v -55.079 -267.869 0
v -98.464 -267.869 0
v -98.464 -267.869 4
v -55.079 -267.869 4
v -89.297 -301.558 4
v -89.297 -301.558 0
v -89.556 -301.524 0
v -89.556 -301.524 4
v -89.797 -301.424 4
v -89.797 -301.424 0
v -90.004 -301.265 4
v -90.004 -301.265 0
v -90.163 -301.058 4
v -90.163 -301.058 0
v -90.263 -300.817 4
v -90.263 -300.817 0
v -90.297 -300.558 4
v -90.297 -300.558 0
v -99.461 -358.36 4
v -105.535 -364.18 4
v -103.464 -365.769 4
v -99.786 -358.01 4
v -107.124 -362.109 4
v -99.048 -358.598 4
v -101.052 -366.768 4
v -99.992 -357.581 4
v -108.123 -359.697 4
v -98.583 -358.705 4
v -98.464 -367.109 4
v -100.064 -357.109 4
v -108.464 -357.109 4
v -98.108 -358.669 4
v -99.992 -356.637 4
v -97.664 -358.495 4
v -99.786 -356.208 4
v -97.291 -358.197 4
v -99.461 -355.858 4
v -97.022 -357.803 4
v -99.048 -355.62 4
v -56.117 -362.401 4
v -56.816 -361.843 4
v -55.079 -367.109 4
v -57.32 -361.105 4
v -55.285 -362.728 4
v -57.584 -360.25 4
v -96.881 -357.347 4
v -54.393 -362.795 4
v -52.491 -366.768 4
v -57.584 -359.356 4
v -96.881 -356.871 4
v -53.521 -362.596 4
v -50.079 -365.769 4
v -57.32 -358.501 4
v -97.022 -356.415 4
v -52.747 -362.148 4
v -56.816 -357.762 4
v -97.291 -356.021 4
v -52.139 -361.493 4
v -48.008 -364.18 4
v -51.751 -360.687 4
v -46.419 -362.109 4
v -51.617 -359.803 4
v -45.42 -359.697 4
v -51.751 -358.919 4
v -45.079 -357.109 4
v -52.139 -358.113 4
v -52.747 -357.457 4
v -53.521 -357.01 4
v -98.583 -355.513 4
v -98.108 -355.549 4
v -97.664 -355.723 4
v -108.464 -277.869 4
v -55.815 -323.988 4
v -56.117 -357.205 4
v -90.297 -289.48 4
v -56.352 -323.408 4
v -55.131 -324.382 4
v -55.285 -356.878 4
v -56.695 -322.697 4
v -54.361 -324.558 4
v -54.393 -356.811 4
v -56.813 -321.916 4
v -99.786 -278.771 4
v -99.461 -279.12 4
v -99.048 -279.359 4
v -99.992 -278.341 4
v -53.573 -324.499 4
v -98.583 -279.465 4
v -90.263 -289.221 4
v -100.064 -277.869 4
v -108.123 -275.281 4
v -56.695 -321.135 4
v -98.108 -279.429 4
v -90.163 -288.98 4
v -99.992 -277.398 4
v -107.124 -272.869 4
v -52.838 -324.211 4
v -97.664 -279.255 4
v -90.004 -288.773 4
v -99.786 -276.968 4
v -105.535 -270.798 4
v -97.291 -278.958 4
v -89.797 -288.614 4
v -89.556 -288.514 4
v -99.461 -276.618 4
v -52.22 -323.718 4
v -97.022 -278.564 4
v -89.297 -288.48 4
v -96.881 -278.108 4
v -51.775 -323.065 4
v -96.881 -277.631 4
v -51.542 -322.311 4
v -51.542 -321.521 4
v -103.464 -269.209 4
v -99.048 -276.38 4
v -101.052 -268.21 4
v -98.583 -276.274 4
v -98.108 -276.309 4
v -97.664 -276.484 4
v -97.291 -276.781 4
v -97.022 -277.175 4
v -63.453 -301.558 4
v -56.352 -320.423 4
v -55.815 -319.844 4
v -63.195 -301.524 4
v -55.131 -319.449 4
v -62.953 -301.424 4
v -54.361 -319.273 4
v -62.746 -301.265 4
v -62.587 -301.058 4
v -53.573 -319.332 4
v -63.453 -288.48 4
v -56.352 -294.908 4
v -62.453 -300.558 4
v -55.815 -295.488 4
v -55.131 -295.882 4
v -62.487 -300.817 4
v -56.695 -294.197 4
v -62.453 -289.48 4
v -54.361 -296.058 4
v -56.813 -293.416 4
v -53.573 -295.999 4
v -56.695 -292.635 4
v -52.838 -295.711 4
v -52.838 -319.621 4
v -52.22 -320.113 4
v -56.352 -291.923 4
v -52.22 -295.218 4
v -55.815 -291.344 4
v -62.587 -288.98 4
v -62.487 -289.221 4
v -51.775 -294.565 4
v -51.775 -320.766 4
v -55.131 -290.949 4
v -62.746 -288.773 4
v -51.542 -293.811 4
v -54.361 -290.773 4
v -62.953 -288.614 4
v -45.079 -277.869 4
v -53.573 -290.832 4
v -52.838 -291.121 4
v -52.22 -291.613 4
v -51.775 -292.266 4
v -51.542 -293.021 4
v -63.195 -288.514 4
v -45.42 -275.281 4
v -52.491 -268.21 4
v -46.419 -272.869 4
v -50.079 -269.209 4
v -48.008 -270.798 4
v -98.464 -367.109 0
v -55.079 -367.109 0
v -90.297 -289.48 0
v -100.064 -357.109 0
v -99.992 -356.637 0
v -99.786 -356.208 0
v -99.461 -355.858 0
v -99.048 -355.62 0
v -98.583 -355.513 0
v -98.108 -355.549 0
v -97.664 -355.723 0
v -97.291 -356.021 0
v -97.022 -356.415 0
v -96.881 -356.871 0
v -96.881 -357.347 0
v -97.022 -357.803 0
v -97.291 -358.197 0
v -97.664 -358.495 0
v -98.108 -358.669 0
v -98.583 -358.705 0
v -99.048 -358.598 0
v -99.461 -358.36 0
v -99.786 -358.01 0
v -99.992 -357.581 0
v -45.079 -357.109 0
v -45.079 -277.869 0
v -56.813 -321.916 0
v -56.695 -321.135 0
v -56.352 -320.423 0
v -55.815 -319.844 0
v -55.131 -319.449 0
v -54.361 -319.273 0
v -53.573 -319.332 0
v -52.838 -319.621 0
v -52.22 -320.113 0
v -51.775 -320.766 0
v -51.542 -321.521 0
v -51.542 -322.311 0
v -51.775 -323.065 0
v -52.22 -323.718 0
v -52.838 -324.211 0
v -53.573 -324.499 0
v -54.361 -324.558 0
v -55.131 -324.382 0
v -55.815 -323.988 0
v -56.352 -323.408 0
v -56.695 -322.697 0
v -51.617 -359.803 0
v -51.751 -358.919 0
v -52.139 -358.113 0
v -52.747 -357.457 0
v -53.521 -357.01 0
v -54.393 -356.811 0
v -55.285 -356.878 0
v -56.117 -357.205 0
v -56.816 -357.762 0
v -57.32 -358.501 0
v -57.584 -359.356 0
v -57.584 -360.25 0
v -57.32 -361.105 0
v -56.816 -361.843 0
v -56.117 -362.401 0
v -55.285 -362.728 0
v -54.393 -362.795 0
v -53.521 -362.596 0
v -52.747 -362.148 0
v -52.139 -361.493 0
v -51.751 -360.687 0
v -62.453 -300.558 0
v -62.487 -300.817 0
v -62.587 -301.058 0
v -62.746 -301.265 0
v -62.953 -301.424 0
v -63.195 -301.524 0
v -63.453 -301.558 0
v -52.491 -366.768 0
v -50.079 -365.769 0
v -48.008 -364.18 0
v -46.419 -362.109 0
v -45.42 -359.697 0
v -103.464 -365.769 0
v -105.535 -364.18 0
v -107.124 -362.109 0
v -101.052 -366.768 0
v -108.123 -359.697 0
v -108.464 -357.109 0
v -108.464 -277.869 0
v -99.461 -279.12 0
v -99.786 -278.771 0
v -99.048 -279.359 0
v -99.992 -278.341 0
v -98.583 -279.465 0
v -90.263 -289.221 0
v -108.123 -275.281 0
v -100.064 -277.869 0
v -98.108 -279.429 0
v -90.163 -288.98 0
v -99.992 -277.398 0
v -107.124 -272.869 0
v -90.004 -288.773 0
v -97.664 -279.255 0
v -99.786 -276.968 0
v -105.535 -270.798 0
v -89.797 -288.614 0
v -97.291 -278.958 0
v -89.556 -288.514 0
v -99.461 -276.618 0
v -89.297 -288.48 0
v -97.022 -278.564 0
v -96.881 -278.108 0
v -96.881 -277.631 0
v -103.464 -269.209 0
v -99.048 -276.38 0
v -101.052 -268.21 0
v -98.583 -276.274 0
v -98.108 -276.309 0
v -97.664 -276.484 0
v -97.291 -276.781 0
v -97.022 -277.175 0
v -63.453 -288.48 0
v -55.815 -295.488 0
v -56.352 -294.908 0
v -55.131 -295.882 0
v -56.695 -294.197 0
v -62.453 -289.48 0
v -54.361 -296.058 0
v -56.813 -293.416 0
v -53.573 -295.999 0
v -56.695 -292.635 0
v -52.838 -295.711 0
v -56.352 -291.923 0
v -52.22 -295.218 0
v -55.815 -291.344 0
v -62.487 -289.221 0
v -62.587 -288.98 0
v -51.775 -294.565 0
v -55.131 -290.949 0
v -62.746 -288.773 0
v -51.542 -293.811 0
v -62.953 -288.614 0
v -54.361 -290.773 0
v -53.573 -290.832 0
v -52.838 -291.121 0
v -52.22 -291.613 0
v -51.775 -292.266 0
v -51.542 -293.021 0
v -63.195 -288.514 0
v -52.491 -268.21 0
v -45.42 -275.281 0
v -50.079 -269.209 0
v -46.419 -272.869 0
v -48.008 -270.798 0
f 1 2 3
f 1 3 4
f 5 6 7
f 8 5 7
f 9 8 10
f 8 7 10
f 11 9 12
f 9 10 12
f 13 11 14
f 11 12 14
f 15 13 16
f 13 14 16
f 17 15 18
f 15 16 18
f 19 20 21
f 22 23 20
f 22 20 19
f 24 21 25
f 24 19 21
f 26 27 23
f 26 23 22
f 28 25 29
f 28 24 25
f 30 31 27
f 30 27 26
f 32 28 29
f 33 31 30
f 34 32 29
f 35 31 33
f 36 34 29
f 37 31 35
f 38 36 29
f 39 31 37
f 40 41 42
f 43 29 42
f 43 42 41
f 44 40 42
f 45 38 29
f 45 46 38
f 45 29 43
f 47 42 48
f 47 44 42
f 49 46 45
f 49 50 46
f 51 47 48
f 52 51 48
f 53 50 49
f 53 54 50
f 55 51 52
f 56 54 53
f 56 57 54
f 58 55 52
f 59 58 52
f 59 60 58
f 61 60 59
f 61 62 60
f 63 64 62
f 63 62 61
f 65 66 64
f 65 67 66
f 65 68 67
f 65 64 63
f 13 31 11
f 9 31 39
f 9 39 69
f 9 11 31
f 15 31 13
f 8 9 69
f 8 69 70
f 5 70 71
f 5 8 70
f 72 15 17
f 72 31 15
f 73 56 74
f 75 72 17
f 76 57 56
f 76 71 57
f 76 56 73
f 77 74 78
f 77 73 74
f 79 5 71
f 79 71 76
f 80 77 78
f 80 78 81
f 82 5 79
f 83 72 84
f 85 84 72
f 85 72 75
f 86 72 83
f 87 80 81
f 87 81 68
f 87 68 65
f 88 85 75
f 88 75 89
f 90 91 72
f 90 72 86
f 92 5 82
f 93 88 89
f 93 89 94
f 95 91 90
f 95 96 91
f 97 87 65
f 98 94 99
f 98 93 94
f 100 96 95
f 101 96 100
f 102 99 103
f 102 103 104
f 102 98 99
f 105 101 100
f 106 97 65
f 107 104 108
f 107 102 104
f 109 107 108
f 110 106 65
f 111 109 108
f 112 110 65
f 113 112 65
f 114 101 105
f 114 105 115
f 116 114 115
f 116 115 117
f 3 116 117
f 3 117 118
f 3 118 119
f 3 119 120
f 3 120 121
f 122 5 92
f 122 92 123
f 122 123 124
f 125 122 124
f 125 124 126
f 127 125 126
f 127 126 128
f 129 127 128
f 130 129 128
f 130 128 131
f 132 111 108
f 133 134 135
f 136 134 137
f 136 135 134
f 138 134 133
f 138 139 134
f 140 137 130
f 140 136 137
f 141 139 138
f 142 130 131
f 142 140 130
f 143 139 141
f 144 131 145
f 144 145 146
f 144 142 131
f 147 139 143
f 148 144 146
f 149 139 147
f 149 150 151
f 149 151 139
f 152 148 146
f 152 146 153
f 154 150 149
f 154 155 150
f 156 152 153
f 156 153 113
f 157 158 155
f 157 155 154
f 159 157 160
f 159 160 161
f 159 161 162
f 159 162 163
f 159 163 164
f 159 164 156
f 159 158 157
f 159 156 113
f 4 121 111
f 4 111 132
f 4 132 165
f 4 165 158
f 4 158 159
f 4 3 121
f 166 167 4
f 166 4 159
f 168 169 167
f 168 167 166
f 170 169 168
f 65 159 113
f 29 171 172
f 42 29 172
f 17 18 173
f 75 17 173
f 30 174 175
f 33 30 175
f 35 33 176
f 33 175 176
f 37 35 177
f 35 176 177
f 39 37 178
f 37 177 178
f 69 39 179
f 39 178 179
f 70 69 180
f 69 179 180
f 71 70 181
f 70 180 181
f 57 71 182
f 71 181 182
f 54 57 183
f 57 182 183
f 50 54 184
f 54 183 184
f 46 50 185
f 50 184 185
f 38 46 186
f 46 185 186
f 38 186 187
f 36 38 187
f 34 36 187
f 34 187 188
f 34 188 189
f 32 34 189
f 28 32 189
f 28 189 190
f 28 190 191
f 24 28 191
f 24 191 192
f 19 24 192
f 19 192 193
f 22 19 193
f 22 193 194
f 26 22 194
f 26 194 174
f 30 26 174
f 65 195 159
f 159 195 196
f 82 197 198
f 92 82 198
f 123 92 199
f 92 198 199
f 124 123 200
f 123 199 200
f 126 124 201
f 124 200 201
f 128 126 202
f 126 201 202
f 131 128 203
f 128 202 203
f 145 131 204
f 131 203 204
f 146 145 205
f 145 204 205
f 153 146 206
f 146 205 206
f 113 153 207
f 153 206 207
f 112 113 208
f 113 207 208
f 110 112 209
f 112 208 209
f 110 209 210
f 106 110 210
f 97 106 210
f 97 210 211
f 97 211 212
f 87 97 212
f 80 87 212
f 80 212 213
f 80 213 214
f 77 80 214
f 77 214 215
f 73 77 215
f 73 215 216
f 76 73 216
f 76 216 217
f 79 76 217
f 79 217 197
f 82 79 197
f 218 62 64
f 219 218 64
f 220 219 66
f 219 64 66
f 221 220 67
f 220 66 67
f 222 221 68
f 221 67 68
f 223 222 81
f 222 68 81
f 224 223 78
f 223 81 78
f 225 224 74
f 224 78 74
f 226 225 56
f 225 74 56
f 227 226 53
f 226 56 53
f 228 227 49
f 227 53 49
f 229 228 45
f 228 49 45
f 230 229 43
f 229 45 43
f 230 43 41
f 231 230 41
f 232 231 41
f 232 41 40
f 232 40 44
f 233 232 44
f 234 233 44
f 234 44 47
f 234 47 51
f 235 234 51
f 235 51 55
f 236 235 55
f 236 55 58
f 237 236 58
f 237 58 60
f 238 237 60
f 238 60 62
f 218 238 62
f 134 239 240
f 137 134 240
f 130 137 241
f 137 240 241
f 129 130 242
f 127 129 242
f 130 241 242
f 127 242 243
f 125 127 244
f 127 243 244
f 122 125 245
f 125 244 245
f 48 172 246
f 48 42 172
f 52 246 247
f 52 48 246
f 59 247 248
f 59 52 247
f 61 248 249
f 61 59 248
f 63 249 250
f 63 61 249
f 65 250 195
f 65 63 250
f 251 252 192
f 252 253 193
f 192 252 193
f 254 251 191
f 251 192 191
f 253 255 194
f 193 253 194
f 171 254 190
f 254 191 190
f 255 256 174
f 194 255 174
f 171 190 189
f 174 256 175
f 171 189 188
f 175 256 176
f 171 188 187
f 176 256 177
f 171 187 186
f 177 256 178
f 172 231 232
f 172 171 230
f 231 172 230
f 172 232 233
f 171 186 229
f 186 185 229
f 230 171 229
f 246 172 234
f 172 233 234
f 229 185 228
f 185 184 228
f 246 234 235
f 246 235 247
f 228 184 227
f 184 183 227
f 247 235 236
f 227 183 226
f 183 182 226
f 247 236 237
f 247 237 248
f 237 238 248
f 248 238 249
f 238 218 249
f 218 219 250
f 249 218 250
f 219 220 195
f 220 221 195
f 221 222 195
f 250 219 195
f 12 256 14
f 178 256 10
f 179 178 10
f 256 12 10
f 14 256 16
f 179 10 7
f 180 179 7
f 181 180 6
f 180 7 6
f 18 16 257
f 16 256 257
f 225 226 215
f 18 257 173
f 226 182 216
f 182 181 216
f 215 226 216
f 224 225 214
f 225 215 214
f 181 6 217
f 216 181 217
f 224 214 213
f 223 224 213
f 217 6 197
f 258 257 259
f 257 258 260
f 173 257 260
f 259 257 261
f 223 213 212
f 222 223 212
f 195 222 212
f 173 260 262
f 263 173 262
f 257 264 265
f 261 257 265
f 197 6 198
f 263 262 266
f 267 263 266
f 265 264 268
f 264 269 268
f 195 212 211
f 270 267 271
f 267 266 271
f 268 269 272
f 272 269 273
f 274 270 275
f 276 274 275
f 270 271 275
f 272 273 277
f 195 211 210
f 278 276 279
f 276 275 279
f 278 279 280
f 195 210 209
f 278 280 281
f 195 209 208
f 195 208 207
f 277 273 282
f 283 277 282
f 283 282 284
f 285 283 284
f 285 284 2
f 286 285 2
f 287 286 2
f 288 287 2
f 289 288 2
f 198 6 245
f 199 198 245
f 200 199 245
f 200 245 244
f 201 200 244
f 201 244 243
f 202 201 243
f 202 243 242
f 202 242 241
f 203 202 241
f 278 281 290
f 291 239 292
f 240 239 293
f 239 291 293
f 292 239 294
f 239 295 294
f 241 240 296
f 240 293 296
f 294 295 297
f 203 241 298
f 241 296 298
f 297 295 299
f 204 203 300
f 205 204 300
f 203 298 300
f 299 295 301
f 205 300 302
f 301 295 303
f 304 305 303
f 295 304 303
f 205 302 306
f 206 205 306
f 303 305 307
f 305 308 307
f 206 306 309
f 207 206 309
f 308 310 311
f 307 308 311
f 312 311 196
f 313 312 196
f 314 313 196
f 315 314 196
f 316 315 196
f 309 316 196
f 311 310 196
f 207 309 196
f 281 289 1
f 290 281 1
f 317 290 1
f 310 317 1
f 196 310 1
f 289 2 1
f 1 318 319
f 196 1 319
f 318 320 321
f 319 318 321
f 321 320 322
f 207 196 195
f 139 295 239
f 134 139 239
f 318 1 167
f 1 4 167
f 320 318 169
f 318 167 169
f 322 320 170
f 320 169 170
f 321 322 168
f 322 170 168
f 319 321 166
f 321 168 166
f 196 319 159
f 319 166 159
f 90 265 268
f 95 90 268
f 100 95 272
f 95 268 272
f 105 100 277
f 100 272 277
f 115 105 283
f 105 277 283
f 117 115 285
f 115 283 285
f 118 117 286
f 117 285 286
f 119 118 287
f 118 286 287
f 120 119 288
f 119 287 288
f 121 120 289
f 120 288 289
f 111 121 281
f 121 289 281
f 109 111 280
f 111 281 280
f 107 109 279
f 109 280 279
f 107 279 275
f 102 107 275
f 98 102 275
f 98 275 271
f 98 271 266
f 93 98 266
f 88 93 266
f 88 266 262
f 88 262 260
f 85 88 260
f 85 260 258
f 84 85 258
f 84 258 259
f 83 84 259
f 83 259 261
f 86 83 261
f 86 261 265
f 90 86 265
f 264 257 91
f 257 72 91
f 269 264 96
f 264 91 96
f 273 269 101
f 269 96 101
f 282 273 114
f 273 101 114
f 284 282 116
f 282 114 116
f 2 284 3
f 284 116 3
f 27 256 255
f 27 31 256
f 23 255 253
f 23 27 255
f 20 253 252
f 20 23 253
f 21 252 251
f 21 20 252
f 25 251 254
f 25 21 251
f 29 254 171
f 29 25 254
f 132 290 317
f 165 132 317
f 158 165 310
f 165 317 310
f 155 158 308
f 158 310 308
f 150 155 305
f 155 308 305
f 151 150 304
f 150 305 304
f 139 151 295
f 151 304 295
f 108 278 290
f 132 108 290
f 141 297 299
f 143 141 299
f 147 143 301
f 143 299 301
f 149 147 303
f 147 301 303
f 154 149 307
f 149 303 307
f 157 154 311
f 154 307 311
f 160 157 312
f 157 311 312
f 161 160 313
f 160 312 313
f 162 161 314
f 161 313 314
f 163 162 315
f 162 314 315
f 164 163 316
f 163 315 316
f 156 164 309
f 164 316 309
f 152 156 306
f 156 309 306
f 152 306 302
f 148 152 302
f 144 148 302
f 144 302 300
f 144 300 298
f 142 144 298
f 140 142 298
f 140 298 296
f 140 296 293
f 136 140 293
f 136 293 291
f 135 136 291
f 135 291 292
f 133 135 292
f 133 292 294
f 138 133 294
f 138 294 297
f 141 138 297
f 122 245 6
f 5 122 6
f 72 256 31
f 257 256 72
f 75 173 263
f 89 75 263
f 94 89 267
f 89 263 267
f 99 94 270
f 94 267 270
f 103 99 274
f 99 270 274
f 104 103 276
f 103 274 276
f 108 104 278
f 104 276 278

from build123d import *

# Parameters (mm, degrees)
SKETCH1_W            = 63.384201813
SKETCH1_H            = 99.23964582
BOSS_EXTRUDE1_DEPTH  = 4
M5_CLEARANCE_HOLE1_D = 5.3
FILLET1_R            = 10
M5_CLEARANCE_HOLE2_D = 6
M3_CLEARANCE_HOLE1_D = 3.2


with BuildPart() as part:
    # Sketch1 → Boss-Extrude1 (new body)
    with BuildSketch(Plane.XY):
        with Locations((-76.771477461, -317.489186132)):
            Rectangle(SKETCH1_W, SKETCH1_H)
        with BuildLine():
            Line((-63.453357461, -301.557900971), (-89.297127128, -301.557900971))
            ThreePointArc((-89.297127128, -301.557900971), (-90.004233909, -301.265007752), (-90.297127128, -300.557900971))
            Line((-90.297127128, -300.557900971), (-90.297127128, -289.479666407))
            ThreePointArc((-90.297127128, -289.479666407), (-90.004233909, -288.772559625), (-89.297127128, -288.479666407))
            Line((-89.297127128, -288.479666407), (-63.453357461, -288.479666407))
            ThreePointArc((-63.453357461, -288.479666407), (-62.74625068, -288.772559625), (-62.453357461, -289.479666407))
            Line((-62.453357461, -289.479666407), (-62.453357461, -300.557900971))
            ThreePointArc((-62.453357461, -300.557900971), (-62.74625068, -301.265007752), (-63.453357461, -301.557900971))
        make_face(mode=Mode.SUBTRACT)
    extrude(amount=BOSS_EXTRUDE1_DEPTH)

    # M5 Clearance Hole1 (through all)
    with Locations(Plane.XY.offset(4)):
        with Locations((-54.16270611, -321.915681156), (-54.16270611, -293.415681156)):
            Hole(M5_CLEARANCE_HOLE1_D / 2)

    # Fillet1
    fillet1_edges = [part.edges().sort_by_distance(p)[0] for p in [
        (-108.463578367, -267.869363222, 2),
        (-45.079376554, -267.869363222, 2),
        (-45.079376554, -367.109009042, 2),
        (-108.463578367, -367.109009042, 2),
    ]]
    fillet(fillet1_edges, radius=FILLET1_R)

    # M5 Clearance Hole2 (through all)
    with Locations(Plane(origin=(0, 0, 0), x_dir=(-1, 0, 0), z_dir=(0, 0, -1))):
        with Locations((54.617319332, -359.802896905)):
            Hole(M5_CLEARANCE_HOLE2_D / 2)

    # M3 Clearance Hole1 (through all)
    with Locations(Plane.XY.offset(4)):
        with Locations((-98.463578367, -357.109009042), (-98.463578367, -277.869363222)):
            Hole(M3_CLEARANCE_HOLE1_D / 2)


solid = part.part
